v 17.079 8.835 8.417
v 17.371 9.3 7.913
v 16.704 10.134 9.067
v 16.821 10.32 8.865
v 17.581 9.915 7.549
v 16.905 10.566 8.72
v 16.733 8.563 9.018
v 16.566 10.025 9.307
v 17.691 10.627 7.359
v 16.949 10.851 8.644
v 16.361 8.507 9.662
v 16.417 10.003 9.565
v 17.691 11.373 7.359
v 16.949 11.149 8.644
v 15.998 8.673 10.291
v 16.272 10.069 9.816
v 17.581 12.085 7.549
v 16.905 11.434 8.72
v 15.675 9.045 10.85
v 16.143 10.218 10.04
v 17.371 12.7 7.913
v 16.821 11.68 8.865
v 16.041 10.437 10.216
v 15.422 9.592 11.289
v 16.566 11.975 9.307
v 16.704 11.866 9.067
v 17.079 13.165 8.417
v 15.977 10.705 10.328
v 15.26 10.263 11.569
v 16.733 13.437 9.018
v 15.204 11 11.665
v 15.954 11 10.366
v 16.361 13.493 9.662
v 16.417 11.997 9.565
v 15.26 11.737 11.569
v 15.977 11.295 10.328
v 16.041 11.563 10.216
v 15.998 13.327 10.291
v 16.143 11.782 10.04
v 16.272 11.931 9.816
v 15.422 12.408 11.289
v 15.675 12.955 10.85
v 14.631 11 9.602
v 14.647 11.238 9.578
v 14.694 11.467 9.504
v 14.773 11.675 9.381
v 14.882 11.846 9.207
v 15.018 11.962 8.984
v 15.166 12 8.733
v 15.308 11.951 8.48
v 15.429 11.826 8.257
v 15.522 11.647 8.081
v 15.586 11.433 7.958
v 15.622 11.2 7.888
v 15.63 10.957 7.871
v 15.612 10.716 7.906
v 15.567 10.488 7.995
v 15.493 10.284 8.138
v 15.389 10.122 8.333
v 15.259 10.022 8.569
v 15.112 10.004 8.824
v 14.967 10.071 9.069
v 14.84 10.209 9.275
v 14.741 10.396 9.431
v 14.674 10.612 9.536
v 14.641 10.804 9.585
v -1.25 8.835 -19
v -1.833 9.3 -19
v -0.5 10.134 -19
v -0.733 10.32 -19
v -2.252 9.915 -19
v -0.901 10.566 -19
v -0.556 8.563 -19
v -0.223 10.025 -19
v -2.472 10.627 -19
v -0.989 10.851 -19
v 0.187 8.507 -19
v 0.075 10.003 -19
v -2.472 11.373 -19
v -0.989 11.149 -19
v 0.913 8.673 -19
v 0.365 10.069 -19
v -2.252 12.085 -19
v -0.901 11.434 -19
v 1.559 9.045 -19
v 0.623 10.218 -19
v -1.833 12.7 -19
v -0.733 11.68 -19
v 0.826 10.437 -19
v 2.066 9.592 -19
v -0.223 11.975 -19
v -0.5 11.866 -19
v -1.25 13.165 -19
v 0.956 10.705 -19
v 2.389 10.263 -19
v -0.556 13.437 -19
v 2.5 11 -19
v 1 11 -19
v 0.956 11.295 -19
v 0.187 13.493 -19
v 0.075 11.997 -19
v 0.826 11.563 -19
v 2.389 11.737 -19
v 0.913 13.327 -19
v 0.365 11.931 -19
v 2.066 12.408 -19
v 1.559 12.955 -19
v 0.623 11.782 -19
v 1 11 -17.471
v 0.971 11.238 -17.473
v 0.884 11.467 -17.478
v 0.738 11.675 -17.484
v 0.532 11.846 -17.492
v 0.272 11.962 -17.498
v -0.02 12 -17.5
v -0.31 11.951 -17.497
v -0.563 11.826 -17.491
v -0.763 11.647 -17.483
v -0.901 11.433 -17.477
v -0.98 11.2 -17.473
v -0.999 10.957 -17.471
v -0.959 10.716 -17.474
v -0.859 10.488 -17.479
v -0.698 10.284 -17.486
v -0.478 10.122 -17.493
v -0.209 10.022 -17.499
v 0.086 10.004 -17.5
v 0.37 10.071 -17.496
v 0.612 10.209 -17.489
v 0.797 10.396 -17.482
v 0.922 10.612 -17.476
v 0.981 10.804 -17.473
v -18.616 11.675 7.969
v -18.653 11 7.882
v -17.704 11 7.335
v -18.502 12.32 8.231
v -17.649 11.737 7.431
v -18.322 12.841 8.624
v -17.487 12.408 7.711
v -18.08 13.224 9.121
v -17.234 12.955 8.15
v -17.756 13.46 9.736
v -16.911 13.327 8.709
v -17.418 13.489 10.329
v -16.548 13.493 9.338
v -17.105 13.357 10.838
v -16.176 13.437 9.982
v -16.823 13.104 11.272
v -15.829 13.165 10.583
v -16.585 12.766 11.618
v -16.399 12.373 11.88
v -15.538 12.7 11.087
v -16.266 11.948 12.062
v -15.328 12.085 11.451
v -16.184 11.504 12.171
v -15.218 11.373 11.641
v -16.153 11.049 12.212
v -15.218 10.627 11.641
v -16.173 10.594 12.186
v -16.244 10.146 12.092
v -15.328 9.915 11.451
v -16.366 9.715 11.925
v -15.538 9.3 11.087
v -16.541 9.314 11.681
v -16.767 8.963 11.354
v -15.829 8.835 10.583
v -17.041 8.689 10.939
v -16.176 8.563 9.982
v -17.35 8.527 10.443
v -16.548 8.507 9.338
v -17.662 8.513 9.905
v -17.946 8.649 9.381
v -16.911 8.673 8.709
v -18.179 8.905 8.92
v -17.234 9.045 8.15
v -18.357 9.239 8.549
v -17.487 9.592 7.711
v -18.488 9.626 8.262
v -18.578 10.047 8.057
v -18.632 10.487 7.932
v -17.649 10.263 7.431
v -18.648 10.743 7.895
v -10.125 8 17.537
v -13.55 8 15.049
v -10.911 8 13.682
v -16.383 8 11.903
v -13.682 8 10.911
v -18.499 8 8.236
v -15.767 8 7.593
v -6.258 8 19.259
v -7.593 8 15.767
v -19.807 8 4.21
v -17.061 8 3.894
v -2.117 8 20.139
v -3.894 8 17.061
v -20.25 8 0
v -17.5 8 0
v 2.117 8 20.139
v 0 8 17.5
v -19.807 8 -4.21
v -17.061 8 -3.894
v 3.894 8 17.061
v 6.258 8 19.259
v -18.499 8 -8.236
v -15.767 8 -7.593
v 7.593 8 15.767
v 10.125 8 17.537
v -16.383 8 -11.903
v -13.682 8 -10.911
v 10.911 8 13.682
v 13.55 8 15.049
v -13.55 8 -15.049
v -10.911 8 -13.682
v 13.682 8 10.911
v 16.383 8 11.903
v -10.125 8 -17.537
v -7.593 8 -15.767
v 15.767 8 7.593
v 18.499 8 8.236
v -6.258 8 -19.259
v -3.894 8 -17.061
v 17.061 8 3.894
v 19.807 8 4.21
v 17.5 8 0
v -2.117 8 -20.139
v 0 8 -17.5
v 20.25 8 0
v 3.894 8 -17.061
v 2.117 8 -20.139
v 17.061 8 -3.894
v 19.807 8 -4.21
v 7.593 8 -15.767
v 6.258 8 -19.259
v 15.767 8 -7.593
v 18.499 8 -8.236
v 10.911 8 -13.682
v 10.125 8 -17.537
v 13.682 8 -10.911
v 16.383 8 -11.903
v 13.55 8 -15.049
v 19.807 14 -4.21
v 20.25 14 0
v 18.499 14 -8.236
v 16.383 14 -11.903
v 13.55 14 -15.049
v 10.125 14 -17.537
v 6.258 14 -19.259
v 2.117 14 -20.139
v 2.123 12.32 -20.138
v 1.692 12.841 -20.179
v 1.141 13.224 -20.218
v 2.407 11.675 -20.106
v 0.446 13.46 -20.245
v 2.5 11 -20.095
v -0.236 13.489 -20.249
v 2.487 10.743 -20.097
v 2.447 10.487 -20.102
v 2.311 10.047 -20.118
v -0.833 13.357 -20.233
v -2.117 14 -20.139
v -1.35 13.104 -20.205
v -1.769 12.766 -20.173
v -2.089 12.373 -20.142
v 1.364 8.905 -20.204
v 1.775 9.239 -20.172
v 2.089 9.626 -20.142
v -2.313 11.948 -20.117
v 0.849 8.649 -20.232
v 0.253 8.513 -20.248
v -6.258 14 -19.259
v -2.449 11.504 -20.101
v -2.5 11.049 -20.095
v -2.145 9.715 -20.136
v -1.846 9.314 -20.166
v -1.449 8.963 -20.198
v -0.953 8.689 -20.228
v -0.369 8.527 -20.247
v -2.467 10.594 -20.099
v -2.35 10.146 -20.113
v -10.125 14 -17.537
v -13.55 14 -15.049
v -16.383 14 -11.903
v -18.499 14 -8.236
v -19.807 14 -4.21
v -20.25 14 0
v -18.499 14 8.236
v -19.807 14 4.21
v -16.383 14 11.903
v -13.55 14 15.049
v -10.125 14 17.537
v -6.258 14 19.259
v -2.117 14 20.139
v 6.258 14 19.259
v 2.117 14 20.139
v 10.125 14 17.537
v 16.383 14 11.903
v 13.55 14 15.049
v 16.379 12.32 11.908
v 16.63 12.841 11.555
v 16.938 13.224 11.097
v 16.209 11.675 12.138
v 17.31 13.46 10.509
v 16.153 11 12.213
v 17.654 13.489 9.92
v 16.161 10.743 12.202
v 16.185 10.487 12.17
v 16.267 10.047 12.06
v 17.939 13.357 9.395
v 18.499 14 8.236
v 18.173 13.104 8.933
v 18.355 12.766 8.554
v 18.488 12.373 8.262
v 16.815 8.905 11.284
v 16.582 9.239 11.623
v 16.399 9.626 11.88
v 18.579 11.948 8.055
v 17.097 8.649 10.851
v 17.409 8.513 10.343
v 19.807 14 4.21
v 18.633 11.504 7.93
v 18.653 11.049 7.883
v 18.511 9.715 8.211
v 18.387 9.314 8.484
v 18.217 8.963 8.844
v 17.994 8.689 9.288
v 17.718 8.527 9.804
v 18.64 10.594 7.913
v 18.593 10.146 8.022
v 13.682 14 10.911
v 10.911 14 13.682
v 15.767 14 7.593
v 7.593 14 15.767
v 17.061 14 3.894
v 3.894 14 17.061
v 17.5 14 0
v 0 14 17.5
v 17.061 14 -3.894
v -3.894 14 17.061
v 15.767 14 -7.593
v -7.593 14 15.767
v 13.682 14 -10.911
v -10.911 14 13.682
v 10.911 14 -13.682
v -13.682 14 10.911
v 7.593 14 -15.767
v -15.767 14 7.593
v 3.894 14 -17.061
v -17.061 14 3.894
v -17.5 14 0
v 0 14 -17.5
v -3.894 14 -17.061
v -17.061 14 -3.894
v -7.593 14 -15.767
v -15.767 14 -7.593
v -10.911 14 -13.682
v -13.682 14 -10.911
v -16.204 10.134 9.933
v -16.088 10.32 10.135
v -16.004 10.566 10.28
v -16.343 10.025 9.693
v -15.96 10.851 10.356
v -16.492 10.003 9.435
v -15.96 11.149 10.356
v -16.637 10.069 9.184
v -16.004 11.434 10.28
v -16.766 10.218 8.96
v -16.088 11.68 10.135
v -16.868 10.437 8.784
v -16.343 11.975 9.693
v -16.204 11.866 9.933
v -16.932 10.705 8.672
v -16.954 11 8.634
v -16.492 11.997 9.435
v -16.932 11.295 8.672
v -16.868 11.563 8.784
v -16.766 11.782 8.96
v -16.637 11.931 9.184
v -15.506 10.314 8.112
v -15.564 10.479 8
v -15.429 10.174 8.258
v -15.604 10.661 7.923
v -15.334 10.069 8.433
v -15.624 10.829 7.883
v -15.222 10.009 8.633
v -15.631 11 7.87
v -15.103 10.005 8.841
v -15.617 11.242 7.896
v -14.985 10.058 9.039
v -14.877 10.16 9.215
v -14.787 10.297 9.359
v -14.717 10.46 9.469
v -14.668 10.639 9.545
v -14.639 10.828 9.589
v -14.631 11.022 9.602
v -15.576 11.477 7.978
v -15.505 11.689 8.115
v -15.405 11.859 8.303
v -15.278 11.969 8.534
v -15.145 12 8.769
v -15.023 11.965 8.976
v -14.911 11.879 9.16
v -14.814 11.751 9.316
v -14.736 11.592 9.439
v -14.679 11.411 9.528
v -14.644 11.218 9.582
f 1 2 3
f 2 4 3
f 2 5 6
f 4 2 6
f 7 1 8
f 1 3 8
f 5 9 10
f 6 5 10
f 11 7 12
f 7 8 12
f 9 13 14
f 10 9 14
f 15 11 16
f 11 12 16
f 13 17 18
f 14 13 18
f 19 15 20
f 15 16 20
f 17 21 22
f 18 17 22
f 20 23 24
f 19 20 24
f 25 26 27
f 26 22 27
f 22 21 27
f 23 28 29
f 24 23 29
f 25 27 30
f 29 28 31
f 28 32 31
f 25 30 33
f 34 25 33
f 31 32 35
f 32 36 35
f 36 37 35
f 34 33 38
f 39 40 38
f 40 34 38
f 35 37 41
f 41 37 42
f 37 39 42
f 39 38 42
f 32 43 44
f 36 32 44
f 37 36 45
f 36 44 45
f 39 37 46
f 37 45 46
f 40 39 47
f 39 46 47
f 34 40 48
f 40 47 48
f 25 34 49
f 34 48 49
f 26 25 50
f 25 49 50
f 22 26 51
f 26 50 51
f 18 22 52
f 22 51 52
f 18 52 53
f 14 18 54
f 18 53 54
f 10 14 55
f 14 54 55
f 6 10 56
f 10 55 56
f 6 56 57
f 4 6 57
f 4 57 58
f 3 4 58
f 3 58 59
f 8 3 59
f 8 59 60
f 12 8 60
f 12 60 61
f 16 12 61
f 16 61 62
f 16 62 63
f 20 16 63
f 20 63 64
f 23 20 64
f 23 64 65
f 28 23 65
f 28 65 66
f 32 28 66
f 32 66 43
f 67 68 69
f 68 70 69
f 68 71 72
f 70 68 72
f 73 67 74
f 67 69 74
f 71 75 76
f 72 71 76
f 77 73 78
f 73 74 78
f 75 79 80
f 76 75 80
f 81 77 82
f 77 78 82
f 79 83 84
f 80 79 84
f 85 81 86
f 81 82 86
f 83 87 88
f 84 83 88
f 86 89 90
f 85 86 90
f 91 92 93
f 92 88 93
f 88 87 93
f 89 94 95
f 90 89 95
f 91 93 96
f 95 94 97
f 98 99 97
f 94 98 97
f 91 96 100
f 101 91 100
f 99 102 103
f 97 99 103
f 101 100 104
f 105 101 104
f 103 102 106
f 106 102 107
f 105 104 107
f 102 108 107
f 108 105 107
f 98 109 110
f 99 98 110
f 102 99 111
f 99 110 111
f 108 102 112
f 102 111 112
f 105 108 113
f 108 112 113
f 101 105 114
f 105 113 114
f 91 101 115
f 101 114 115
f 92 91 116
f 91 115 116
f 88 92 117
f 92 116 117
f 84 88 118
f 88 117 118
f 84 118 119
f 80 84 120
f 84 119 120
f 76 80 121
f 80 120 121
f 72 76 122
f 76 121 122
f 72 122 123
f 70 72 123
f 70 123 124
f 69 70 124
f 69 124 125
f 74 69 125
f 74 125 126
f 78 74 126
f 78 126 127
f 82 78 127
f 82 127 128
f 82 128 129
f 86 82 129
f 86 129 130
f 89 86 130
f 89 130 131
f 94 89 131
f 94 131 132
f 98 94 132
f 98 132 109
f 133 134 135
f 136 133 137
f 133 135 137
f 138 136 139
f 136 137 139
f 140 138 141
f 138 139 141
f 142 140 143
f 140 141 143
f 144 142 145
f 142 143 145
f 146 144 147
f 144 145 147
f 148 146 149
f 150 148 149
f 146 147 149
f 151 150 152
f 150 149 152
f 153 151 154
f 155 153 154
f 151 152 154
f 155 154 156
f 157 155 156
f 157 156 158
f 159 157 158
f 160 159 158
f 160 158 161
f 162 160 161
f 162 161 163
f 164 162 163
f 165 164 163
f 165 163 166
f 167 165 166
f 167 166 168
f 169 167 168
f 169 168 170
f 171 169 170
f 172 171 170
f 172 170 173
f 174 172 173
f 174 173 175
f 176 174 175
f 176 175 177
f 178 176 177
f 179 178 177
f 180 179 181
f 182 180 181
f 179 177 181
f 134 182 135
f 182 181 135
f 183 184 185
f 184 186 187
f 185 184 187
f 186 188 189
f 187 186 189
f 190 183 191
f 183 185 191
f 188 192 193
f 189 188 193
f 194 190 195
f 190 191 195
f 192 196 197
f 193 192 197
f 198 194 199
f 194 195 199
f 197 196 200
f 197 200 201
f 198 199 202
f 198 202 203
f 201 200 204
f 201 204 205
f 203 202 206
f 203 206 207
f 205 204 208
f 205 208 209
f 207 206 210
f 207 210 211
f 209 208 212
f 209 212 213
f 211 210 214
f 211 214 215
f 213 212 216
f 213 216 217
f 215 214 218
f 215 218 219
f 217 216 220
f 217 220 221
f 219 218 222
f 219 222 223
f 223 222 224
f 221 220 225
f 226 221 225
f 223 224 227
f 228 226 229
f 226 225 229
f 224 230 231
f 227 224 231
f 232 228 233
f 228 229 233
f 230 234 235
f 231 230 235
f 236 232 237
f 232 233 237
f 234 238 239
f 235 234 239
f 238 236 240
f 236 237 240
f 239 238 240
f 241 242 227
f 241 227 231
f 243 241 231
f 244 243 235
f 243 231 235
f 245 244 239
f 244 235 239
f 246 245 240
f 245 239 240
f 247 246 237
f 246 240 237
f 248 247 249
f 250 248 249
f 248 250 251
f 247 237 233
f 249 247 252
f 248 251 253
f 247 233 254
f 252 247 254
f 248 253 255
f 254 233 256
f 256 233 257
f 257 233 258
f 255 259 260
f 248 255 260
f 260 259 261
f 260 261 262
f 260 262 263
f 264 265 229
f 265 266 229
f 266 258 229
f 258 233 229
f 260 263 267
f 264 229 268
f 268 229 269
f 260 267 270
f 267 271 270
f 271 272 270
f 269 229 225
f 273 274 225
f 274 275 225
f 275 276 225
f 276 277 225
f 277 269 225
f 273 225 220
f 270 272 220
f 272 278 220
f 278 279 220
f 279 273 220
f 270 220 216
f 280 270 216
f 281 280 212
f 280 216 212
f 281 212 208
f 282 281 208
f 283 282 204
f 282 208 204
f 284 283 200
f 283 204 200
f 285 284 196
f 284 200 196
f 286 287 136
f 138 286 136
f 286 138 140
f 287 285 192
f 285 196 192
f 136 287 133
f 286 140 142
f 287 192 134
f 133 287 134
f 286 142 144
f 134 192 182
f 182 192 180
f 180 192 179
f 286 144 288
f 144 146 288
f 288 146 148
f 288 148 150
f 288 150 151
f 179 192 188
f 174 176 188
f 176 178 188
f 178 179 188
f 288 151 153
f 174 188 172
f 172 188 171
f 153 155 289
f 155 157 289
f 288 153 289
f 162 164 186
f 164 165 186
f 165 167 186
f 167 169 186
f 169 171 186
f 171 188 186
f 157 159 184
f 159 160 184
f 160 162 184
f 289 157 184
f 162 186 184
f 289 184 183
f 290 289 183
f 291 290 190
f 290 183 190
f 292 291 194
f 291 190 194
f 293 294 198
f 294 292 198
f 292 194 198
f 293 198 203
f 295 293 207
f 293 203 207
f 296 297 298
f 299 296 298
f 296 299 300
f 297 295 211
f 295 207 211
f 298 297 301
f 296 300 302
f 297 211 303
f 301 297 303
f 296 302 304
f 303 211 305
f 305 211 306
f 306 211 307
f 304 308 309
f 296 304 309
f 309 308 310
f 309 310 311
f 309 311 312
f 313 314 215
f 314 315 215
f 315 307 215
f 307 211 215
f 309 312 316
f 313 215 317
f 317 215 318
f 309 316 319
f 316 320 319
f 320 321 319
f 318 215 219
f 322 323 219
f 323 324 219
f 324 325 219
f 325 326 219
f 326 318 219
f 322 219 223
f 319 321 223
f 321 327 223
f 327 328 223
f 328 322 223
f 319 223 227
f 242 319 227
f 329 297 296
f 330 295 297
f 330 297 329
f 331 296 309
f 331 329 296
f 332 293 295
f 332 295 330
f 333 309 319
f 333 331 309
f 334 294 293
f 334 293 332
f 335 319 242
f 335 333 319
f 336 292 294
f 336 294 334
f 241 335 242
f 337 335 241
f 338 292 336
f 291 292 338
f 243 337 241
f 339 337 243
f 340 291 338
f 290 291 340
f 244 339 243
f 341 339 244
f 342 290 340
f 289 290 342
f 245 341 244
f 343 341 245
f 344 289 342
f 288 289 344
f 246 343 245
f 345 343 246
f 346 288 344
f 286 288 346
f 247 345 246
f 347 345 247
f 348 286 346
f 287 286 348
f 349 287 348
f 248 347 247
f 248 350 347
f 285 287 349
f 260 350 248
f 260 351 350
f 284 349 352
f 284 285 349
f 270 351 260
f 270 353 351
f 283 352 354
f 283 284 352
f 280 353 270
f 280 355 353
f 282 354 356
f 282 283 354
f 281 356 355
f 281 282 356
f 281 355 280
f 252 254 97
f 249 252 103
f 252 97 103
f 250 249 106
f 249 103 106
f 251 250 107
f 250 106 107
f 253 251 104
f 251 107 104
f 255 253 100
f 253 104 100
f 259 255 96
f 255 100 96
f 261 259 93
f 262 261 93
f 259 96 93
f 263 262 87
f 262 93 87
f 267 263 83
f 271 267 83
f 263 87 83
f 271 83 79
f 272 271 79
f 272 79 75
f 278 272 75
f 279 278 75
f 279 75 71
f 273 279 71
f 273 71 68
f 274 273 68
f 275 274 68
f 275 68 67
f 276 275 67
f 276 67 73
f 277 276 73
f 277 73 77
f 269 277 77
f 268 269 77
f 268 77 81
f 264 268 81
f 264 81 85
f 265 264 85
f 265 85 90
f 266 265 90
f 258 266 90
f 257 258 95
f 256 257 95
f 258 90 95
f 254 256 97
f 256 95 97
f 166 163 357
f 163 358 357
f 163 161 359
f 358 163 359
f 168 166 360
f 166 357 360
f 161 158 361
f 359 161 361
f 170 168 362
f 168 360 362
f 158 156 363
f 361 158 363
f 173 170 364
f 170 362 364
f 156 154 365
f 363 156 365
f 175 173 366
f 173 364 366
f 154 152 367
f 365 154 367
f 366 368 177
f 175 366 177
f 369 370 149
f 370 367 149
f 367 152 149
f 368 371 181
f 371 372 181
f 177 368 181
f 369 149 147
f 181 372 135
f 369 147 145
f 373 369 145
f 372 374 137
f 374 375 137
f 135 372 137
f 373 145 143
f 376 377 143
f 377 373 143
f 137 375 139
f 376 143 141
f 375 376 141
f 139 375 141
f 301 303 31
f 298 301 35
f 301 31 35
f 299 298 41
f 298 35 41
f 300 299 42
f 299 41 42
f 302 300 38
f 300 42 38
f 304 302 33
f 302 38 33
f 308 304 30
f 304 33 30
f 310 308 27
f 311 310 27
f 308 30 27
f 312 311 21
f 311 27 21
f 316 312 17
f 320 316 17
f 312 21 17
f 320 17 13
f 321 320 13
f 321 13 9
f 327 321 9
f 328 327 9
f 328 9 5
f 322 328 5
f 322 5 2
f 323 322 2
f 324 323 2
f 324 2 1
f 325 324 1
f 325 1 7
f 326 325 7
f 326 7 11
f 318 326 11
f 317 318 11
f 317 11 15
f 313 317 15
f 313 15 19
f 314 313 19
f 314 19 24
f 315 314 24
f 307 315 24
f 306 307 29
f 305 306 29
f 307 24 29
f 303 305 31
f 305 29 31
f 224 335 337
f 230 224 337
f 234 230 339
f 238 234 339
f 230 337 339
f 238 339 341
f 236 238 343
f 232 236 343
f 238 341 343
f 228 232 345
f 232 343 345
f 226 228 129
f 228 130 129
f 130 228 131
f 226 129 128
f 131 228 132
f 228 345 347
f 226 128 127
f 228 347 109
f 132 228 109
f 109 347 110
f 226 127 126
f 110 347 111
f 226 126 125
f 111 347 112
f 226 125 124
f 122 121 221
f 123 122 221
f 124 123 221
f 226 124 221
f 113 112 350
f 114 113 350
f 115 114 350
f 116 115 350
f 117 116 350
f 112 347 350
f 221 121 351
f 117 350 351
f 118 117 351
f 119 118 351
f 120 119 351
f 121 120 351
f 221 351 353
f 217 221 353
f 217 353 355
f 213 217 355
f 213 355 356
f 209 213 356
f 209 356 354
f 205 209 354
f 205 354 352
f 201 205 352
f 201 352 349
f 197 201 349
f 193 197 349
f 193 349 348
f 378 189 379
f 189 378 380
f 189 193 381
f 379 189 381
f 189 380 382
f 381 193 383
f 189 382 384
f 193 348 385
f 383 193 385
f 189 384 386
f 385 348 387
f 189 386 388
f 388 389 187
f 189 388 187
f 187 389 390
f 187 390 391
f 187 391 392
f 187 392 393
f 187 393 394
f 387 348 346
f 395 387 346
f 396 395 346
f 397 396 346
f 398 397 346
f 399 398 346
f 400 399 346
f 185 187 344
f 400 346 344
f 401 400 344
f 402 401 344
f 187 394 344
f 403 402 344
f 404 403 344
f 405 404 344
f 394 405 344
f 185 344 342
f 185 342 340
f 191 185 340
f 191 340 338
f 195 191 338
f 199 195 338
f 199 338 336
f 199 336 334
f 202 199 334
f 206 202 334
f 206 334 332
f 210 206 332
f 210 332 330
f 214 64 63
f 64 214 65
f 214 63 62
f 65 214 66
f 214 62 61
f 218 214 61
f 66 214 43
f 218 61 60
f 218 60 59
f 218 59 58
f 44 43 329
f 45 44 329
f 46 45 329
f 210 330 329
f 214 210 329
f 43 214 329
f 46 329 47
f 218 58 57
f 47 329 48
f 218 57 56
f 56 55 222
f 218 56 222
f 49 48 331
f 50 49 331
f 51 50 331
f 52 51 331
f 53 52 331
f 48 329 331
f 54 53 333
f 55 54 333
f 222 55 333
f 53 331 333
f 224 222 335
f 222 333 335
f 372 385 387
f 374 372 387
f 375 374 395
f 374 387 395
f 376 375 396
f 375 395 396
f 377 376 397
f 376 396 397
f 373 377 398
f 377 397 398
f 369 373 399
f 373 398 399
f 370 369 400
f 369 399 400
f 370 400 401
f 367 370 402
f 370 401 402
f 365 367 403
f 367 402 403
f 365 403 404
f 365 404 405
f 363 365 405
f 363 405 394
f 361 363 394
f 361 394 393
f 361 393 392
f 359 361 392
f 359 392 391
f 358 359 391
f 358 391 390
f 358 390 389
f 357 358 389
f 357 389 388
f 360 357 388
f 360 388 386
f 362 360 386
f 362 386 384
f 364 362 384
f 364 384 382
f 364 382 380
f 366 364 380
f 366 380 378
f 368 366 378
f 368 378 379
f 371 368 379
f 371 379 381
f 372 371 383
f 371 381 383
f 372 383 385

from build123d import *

# Parameters (mm, degrees)
BOSS_EXTRUDE1_DEPTH      = 8
BOSS_EXTRUDE1_DEPTH_BACK = 25
SKETCH1_R                = 17.45
SKETCH1_R_2              = 12.45
SKETCH2_R                = 20.25
SKETCH2_R_2              = 12.45
BOSS_EXTRUDE2_DEPTH      = 40
CUT_EXTRUDE1_START       = -221
SKETCH3_R                = 17.5
SKETCH3_R_2              = 12.45
CUT_EXTRUDE1_DEPTH       = 221
CUT_EXTRUDE2_DEPTH       = 221
CUT_EXTRUDE2_DEPTH_BACK  = 221
SKETCH4_W                = 78.3000253
SKETCH4_H                = 101.772836534
SKETCH5_R                = 1
CUT_EXTRUDE3_DEPTH       = 221
CUT_EXTRUDE4_START       = -19
SKETCH6_R                = 2.5
CUT_EXTRUDE4_DEPTH       = 221
CIRPATTERN1_COUNT        = 3


with BuildPart() as part:
    # Sketch1 → Boss-Extrude1 (new, two sides: drawn at the far end of the back side and taken through both)
    with BuildSketch(Plane(origin=(0, 0, 0), x_dir=(1, 0, 0), z_dir=(0, 1, 0)).offset(-BOSS_EXTRUDE1_DEPTH_BACK)):
        Circle(SKETCH1_R)
        Circle(SKETCH1_R_2, mode=Mode.SUBTRACT)
    extrude(amount=BOSS_EXTRUDE1_DEPTH + BOSS_EXTRUDE1_DEPTH_BACK)

    # Sketch2 → Boss-Extrude2 (add)
    with BuildSketch(Plane(origin=(0, 8, 0), x_dir=(1, 0, 0), z_dir=(0, 1, 0))):
        Circle(SKETCH2_R)
        Circle(SKETCH2_R_2, mode=Mode.SUBTRACT)
    extrude(amount=BOSS_EXTRUDE2_DEPTH)

    # Sketch3 → Cut-Extrude1 (cut)
    with BuildSketch(Plane(origin=(0, 48, 0), x_dir=(1, 0, 0), z_dir=(0, 1, 0)).offset(CUT_EXTRUDE1_START)):
        Circle(SKETCH3_R)
        Circle(SKETCH3_R_2, mode=Mode.SUBTRACT)
    extrude(amount=CUT_EXTRUDE1_DEPTH, mode=Mode.SUBTRACT)

    # Sketch4 → Cut-Extrude2 (cut, two sides: drawn at the far end of the back side and taken through both)
    with BuildSketch(Plane(origin=(0, 0, 0), x_dir=(0, 0, -1), z_dir=(1, 0, 0)).offset(-CUT_EXTRUDE2_DEPTH_BACK)):
        with Locations((-0.109307072, 64.886418267)):
            Rectangle(SKETCH4_W, SKETCH4_H)
    extrude(amount=CUT_EXTRUDE2_DEPTH + CUT_EXTRUDE2_DEPTH_BACK, mode=Mode.SUBTRACT)

    # Sketch5 → Cut-Extrude3 (cut)
    with BuildSketch(Plane.XY):
        with Locations((0, 11)):
            Circle(SKETCH5_R)
    cut_extrude3 = extrude(amount=-CUT_EXTRUDE3_DEPTH, mode=Mode.SUBTRACT)

    # Sketch6 → Cut-Extrude4 (cut)
    with BuildSketch(Plane.XY.offset(CUT_EXTRUDE4_START)):
        with Locations((0, 11)):
            Circle(SKETCH6_R)
    cut_extrude4 = extrude(amount=-CUT_EXTRUDE4_DEPTH, mode=Mode.SUBTRACT)

    # CirPattern1: Cut-Extrude3, Cut-Extrude4 ×3 about axis
    cirpattern1_axis = Axis((0, 14, 0), (0, -1, 0))
    add([cut_extrude3.rotate(cirpattern1_axis, i * 360 / CIRPATTERN1_COUNT) for i in range(1, CIRPATTERN1_COUNT)], mode=Mode.SUBTRACT)
    add([cut_extrude4.rotate(cirpattern1_axis, i * 360 / CIRPATTERN1_COUNT) for i in range(1, CIRPATTERN1_COUNT)], mode=Mode.SUBTRACT)


solid = part.part
